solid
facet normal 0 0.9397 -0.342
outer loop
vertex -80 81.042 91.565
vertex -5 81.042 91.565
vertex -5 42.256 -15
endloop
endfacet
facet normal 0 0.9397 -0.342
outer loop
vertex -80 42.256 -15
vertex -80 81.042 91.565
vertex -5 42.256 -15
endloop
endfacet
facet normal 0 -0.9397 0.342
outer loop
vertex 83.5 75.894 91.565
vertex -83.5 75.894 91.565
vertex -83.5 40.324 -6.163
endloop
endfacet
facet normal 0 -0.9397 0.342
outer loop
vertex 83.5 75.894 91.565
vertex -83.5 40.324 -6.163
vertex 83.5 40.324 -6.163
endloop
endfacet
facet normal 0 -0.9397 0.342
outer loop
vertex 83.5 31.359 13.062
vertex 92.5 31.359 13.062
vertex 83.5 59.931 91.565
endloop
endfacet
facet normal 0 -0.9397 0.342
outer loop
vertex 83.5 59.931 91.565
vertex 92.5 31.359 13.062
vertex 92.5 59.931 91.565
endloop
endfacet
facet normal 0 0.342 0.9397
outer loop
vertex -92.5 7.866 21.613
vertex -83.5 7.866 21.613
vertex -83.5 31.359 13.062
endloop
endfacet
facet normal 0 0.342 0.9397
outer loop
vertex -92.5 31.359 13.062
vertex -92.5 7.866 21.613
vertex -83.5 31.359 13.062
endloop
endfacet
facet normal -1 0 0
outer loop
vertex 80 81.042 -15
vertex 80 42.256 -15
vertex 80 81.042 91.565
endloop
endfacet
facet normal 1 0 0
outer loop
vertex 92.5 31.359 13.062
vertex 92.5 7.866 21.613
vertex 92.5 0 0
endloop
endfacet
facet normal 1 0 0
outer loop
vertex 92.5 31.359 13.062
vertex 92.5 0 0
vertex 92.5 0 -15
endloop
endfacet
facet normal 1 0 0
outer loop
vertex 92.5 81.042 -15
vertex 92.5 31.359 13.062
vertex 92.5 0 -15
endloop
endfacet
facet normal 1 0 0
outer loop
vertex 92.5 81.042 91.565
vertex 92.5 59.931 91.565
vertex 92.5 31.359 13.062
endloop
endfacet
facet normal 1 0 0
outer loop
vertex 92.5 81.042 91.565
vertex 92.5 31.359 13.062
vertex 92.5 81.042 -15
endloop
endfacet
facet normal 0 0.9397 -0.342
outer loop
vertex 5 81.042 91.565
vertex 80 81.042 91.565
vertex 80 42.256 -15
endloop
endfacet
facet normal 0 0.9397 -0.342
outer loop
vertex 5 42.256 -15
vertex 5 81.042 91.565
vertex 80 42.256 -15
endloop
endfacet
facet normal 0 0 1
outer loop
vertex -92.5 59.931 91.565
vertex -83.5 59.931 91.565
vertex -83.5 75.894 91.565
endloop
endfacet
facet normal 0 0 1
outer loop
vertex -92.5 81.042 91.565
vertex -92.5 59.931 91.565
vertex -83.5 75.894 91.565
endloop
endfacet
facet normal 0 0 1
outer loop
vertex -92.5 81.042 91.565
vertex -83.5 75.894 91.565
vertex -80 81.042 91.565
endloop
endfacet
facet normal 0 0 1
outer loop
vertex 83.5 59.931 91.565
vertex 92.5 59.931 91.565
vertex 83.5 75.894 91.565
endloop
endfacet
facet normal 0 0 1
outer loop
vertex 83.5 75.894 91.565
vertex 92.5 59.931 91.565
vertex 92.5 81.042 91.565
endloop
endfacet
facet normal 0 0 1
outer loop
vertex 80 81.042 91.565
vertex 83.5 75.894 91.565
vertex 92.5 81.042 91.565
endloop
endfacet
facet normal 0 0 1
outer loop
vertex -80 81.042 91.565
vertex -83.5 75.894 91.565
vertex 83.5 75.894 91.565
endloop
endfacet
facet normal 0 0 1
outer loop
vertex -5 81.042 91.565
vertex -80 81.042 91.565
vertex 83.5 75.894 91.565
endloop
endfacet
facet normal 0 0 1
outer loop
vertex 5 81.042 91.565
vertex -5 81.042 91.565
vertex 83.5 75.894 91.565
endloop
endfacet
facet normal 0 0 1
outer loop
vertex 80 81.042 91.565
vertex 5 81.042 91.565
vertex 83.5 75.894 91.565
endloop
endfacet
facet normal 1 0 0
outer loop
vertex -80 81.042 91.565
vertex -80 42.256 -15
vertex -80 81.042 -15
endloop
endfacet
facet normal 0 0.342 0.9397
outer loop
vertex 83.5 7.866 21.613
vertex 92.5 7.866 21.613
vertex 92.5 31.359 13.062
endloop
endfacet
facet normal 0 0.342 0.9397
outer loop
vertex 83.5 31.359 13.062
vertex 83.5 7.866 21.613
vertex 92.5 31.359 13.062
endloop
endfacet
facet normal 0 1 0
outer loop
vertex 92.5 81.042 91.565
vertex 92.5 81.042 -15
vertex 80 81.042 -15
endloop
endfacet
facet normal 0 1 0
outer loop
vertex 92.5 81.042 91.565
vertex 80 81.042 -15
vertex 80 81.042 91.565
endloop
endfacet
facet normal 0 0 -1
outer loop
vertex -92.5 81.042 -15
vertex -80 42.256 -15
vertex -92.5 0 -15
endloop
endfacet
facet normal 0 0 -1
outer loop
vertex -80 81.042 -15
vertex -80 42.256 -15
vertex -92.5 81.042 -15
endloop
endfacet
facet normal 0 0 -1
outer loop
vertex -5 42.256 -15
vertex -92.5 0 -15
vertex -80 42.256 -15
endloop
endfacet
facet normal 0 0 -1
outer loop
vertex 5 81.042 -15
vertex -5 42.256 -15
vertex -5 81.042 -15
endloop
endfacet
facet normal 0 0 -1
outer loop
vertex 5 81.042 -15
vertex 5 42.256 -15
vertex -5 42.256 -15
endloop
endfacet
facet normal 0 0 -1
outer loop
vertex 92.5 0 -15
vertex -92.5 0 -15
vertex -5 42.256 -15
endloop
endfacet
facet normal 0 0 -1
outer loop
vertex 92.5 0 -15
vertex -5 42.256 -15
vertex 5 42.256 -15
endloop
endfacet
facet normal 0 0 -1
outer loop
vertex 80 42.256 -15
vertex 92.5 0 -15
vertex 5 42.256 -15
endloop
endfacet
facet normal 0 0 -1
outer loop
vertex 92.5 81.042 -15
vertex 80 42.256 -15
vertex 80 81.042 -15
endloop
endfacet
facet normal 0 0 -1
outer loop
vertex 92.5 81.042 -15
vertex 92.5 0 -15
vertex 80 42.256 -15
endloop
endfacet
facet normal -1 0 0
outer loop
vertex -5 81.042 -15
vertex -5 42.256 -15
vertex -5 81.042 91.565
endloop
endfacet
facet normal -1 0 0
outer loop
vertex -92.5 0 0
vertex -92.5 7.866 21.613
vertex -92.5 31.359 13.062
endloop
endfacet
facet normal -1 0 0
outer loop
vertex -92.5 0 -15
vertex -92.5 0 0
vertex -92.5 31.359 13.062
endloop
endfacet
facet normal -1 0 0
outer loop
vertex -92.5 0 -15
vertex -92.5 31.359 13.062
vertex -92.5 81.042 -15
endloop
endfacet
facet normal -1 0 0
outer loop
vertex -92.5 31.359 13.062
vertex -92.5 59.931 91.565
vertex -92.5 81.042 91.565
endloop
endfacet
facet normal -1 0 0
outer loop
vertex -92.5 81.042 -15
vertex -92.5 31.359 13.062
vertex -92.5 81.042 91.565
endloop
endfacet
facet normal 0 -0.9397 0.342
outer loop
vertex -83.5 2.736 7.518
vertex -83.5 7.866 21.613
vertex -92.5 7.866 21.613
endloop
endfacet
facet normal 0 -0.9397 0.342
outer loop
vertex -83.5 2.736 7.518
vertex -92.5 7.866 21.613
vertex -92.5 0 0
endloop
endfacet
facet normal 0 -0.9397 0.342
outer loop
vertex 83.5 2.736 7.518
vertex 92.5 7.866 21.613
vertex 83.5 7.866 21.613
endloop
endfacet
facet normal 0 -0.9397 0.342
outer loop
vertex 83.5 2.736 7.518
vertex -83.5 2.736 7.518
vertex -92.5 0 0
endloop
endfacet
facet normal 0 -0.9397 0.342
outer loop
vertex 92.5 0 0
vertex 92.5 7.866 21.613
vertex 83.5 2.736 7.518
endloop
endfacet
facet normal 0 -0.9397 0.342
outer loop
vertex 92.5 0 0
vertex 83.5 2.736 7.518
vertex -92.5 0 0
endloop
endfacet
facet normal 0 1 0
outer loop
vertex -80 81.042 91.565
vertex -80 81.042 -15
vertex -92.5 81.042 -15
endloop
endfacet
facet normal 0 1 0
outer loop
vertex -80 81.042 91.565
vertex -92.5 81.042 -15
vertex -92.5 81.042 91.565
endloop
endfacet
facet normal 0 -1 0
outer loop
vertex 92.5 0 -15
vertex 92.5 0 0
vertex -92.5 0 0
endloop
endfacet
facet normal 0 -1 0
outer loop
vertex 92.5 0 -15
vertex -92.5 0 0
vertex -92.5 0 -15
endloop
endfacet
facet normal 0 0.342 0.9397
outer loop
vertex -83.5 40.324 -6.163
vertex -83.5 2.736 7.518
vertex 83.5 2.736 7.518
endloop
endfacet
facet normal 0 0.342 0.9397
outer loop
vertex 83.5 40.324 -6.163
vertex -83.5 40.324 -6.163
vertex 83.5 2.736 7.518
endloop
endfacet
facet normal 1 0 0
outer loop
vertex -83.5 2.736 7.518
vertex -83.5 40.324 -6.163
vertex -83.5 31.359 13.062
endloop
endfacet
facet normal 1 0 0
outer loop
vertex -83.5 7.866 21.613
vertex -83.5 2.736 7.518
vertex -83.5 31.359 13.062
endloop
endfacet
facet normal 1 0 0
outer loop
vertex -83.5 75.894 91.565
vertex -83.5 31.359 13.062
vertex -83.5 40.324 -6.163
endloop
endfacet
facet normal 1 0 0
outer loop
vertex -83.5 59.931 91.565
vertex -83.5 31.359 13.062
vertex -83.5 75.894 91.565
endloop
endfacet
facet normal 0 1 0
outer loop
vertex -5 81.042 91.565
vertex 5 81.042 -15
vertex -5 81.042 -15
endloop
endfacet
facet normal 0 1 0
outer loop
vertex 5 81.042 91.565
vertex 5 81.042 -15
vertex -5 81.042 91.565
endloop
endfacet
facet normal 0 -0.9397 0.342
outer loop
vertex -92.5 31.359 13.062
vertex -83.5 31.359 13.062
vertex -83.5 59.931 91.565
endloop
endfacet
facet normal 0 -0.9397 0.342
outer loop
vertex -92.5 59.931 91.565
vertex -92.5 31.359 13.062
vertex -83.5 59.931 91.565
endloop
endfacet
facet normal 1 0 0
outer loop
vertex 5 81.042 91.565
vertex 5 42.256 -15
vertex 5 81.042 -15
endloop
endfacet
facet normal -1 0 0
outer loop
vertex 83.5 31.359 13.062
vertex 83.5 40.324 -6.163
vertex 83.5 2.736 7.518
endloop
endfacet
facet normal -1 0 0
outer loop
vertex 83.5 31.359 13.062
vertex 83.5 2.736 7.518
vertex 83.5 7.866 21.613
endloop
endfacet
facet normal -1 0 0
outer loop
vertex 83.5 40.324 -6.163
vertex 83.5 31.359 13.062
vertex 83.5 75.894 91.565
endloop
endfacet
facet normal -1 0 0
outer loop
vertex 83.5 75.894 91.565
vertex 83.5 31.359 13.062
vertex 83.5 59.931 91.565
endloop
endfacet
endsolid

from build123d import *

# Parameters (mm, degrees)
F0_W      = 40
F0_H      = 112.7631144943
F1_DEPTH  = 92.5
F2_W      = 167
F2_H      = 104
F3_DEPTH  = 40
F4_W      = 19.1075097164
F4_H      = 21.1983466993
F5_DEPTH  = 200
F7_DEPTH  = 200
F9_DEPTH  = 80
F10_DEPTH = 5


with BuildPart() as f1:
    # F0 (on Right) → F1 (new body, symmetric)
    with BuildSketch(Plane.YZ):
        Polygon((41.0424171991, 112.7631144943), (0, 0), (41.0424171991, 0), align=None)
        Polygon((41.0424171991, 0), (0, 0), (0, -15), (81.0424171991, -15), (81.0424171991, 0), align=None)
        with Locations((61.0424171991, 56.3815572472)):
            Rectangle(F0_W, F0_H)
    extrude(amount=F1_DEPTH, both=True)

    # F2 (on face) → F3 (cut)
    with BuildSketch(Plane(origin=(0, 0, 0), x_dir=(1, 0, 0), z_dir=(0, -0.9396926208, 0.3420201433))):
        with Locations((0, 60)):
            Rectangle(F2_W, F2_H)
    extrude(amount=-F3_DEPTH, mode=Mode.SUBTRACT)

    # F4 (on face) → F5 (cut)
    with BuildSketch(Plane.YZ.offset(92.5)):
        with Locations((90.5961720573, 102.1639411447)):
            Rectangle(F4_W, F4_H)
        Polygon((81.0424171991, 91.564767795), (81.0424171991, 112.7631144943), (41.0424171991, 112.7631144943), (33.3268499849, 91.564767795), align=None)
        Polygon((33.3268499849, 91.564767795), (41.0424171991, 112.7631144943), (33.0099269154, 112.7631144943), (33.0099269154, 91.564767795), align=None)
    extrude(amount=-F5_DEPTH, mode=Mode.SUBTRACT)

    # F6 (on face) → F7 (cut)
    with BuildSketch(Plane.YZ.offset(92.5)):
        Polygon((33.3268499849, 91.564767795), (7.8664632965, 21.6129302781), (31.3587788161, 13.0624266949), (59.9312942968, 91.564767795), align=None)
    extrude(amount=-F7_DEPTH, mode=Mode.SUBTRACT)

    # F8 (on Right) → F9 (cut, symmetric)
    with BuildSketch(Plane.YZ):
        Polygon((81.0424171991, -15), (81.0424171991, 91.564767795), (42.2560137002, -15), align=None)
    extrude(amount=F9_DEPTH, both=True, mode=Mode.SUBTRACT)

    # F8 (on Right) → F10 (join, symmetric)
    with BuildSketch(Plane.YZ):
        Polygon((81.0424171991, -15), (81.0424171991, 91.564767795), (42.2560137002, -15), align=None)
    extrude(amount=F10_DEPTH, both=True)


solid = f1.part
